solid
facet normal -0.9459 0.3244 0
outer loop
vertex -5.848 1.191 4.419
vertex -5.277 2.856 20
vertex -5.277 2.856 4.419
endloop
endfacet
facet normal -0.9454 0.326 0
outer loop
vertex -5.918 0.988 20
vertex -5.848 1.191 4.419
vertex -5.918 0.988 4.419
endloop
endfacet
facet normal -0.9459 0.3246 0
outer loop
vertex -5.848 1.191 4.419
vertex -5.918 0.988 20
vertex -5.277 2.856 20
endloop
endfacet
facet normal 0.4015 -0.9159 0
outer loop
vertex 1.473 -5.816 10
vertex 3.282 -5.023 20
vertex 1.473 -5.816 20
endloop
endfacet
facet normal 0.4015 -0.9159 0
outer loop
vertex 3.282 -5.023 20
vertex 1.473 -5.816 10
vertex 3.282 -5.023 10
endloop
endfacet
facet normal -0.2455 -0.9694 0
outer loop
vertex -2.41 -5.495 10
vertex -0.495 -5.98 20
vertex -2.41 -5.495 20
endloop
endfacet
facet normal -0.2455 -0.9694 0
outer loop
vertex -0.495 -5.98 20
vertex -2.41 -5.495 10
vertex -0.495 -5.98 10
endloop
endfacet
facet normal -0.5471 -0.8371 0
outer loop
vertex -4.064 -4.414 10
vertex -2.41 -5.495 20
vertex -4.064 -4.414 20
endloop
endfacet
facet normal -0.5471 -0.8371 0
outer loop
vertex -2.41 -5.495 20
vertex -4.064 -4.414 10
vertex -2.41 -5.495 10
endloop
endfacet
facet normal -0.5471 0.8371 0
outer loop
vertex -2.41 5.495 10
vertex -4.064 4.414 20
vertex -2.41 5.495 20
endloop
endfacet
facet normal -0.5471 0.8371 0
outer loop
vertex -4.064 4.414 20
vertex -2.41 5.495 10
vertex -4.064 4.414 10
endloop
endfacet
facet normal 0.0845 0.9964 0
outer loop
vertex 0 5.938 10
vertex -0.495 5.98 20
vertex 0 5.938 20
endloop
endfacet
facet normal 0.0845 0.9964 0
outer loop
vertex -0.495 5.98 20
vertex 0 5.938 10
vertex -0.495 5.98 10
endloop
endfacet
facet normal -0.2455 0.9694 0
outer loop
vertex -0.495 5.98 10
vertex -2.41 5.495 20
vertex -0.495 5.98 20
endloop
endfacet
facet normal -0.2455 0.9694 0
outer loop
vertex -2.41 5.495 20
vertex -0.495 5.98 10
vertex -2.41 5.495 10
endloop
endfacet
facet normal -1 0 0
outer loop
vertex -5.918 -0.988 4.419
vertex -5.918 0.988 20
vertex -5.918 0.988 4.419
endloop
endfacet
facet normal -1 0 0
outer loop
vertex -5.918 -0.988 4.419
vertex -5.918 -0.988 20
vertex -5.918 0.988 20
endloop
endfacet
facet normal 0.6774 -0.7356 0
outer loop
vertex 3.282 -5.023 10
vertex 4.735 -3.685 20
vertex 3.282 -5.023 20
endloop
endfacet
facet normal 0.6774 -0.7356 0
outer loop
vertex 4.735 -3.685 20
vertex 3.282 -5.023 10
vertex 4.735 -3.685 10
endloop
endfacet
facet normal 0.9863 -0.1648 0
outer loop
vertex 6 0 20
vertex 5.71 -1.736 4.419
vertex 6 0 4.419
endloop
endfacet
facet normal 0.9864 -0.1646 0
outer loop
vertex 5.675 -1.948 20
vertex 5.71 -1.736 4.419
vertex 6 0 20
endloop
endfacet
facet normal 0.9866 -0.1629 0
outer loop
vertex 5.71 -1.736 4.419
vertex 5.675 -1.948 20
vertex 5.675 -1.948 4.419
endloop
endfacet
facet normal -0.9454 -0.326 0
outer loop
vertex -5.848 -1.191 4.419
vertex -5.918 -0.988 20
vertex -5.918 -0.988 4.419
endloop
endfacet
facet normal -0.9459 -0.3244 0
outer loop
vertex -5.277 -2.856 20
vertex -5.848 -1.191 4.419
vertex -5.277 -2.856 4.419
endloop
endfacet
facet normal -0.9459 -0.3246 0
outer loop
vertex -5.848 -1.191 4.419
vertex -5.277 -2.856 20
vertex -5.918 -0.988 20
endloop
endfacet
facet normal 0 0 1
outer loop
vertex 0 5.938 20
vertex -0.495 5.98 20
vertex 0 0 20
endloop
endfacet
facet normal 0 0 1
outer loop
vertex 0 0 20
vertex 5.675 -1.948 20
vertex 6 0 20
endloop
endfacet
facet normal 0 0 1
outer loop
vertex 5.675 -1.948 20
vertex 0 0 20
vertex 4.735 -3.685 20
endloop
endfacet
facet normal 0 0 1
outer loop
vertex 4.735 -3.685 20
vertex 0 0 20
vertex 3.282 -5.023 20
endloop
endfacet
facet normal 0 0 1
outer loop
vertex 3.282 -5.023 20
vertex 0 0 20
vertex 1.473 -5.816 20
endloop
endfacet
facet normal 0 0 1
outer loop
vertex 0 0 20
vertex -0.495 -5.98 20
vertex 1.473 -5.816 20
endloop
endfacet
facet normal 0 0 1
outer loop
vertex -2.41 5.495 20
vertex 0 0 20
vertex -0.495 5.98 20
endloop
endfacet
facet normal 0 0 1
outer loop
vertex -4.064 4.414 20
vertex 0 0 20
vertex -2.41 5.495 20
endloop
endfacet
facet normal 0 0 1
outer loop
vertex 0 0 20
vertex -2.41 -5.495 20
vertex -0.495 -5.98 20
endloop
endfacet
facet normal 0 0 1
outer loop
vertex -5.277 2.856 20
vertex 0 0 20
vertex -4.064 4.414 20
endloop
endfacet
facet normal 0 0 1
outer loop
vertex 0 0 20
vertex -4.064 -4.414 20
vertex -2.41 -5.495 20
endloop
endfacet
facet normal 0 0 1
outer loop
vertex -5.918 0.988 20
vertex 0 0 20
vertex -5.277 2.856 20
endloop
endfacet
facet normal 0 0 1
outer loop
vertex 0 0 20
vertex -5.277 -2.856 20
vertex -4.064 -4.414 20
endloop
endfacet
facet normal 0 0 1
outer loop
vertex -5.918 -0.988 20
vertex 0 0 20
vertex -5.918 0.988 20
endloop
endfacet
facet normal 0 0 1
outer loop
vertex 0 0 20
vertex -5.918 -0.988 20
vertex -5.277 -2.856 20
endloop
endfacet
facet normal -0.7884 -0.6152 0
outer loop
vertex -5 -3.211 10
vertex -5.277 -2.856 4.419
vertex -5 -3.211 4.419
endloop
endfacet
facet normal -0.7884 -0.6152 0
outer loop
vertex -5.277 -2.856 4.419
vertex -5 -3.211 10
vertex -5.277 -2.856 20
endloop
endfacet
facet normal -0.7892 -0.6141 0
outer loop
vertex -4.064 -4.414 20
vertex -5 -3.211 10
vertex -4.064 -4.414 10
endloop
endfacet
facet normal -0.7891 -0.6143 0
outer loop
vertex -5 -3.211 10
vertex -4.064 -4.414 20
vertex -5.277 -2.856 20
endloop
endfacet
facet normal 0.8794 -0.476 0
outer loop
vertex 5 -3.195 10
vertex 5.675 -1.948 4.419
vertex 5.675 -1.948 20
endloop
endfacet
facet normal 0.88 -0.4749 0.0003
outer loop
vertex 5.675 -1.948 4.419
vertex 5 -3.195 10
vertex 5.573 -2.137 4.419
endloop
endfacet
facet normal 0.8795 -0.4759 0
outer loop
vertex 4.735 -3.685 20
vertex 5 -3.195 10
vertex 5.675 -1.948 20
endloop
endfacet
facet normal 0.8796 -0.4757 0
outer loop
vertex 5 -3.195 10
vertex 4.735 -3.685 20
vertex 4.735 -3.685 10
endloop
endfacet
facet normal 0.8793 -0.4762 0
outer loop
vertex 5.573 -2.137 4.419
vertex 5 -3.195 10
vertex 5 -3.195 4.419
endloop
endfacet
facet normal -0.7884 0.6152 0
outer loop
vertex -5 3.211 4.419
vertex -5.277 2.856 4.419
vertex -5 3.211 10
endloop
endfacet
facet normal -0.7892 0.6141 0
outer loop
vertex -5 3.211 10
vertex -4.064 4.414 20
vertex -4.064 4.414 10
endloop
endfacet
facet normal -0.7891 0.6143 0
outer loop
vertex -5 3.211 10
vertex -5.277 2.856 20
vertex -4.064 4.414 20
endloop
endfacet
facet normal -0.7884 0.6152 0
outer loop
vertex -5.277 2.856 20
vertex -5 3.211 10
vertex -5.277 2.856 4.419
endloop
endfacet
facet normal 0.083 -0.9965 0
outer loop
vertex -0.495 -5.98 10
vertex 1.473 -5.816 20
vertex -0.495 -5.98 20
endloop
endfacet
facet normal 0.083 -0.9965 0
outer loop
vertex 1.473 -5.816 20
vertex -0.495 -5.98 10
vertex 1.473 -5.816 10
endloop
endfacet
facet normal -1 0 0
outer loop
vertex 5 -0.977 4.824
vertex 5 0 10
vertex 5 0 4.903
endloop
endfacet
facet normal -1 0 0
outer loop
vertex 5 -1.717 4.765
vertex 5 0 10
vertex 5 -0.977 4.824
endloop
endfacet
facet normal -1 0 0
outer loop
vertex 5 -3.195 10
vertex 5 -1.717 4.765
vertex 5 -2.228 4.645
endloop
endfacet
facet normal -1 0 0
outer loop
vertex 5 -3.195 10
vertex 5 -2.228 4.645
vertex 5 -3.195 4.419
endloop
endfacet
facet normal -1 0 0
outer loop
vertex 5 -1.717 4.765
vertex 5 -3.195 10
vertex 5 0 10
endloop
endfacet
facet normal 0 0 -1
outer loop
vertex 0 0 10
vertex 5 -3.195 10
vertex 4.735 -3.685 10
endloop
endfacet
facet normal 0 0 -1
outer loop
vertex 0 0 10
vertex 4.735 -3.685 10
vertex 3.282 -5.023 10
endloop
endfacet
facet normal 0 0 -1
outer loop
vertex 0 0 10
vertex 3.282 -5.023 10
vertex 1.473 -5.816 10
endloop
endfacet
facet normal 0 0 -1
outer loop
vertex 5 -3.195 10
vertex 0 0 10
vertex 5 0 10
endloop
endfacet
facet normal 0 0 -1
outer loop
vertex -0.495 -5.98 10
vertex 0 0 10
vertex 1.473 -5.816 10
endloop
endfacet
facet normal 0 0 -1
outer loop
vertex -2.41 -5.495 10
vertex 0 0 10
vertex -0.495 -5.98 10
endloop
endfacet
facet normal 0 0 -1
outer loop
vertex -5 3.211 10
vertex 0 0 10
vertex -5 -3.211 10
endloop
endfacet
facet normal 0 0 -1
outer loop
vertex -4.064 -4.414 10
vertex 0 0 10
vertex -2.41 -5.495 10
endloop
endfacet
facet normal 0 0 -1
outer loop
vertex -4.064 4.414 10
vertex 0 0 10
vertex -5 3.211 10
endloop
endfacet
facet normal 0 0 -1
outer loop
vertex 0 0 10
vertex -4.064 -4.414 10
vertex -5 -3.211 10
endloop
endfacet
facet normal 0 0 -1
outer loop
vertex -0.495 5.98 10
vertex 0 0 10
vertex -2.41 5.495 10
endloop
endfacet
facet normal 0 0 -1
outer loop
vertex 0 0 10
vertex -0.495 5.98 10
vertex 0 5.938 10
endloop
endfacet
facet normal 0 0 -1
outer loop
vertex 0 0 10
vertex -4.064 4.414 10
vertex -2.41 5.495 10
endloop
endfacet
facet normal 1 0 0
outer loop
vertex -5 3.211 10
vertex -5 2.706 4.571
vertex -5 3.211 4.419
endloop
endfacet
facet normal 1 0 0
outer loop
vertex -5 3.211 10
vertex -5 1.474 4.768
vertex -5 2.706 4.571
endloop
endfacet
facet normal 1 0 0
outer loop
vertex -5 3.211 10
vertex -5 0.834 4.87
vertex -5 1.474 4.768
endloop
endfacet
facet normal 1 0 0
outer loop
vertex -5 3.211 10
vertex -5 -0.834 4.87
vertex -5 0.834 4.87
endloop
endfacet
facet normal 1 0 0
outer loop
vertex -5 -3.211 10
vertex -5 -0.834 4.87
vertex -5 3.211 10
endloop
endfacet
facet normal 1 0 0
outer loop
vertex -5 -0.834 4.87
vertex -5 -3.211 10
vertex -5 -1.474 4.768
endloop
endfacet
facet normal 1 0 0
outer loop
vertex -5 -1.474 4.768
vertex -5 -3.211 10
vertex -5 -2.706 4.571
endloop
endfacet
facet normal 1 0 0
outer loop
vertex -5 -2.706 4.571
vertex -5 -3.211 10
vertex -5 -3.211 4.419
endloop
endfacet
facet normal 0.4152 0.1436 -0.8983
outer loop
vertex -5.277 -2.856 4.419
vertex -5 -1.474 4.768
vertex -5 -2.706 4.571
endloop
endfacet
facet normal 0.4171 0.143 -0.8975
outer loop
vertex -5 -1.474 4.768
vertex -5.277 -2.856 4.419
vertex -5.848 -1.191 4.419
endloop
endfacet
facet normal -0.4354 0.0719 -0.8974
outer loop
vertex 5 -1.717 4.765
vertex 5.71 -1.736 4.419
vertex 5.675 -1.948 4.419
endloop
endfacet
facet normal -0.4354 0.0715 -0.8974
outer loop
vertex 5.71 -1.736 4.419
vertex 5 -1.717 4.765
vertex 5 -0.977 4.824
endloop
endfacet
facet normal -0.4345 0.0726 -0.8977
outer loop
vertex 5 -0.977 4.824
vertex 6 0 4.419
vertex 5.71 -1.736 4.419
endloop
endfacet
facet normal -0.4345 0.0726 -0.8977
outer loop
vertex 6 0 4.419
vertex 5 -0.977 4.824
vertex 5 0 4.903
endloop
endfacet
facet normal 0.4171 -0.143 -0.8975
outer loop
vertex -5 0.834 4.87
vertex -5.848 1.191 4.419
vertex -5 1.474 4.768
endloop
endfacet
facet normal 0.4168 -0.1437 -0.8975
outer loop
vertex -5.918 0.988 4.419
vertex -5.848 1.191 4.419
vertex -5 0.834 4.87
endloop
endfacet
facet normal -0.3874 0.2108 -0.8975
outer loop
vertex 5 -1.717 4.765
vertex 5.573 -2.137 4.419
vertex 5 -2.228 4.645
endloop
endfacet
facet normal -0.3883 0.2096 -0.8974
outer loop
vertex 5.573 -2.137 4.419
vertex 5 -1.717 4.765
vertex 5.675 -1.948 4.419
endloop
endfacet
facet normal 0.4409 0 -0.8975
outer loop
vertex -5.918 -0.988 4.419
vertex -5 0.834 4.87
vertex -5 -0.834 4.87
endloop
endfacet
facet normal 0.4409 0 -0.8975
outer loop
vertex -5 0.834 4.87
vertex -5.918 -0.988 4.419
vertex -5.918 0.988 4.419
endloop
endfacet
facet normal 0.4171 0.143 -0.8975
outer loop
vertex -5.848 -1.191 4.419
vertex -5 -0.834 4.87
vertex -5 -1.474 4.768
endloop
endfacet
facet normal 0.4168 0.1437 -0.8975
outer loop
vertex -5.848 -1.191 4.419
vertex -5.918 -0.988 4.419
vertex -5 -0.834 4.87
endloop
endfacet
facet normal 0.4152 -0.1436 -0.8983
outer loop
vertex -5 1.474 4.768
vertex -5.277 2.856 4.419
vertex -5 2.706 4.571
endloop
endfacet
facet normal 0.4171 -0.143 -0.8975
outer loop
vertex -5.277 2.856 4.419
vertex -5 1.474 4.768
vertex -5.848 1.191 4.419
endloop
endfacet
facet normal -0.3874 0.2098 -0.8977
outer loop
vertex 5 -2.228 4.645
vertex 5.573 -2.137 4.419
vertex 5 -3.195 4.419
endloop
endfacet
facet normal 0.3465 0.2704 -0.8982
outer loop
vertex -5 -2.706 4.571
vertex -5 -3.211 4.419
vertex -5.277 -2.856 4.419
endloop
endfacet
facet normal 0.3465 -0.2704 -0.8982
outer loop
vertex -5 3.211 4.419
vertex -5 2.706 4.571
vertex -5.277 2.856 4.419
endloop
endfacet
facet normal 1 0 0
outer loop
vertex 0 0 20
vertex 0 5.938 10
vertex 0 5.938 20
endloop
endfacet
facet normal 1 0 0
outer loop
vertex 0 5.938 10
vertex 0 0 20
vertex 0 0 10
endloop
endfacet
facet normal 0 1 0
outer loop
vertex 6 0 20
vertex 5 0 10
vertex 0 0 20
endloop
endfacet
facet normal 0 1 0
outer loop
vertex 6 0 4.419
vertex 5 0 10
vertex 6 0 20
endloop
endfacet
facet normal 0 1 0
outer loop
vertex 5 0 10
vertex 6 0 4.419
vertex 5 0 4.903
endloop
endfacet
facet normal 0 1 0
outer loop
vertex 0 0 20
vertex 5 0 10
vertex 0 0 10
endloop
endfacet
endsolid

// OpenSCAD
// Generated by generate_scads.py
difference() {
  difference() {
    cylinder(h=20, r=6, center=false);
    sphere(r=2);
    cube(size=[10,20,20], center=true);
    sphere(r=6);
  }
  scale([1.5,1.5,1.0]) {
    sphere(r=6);
  }
  cube(size=[20,20,20], center=false);
}
